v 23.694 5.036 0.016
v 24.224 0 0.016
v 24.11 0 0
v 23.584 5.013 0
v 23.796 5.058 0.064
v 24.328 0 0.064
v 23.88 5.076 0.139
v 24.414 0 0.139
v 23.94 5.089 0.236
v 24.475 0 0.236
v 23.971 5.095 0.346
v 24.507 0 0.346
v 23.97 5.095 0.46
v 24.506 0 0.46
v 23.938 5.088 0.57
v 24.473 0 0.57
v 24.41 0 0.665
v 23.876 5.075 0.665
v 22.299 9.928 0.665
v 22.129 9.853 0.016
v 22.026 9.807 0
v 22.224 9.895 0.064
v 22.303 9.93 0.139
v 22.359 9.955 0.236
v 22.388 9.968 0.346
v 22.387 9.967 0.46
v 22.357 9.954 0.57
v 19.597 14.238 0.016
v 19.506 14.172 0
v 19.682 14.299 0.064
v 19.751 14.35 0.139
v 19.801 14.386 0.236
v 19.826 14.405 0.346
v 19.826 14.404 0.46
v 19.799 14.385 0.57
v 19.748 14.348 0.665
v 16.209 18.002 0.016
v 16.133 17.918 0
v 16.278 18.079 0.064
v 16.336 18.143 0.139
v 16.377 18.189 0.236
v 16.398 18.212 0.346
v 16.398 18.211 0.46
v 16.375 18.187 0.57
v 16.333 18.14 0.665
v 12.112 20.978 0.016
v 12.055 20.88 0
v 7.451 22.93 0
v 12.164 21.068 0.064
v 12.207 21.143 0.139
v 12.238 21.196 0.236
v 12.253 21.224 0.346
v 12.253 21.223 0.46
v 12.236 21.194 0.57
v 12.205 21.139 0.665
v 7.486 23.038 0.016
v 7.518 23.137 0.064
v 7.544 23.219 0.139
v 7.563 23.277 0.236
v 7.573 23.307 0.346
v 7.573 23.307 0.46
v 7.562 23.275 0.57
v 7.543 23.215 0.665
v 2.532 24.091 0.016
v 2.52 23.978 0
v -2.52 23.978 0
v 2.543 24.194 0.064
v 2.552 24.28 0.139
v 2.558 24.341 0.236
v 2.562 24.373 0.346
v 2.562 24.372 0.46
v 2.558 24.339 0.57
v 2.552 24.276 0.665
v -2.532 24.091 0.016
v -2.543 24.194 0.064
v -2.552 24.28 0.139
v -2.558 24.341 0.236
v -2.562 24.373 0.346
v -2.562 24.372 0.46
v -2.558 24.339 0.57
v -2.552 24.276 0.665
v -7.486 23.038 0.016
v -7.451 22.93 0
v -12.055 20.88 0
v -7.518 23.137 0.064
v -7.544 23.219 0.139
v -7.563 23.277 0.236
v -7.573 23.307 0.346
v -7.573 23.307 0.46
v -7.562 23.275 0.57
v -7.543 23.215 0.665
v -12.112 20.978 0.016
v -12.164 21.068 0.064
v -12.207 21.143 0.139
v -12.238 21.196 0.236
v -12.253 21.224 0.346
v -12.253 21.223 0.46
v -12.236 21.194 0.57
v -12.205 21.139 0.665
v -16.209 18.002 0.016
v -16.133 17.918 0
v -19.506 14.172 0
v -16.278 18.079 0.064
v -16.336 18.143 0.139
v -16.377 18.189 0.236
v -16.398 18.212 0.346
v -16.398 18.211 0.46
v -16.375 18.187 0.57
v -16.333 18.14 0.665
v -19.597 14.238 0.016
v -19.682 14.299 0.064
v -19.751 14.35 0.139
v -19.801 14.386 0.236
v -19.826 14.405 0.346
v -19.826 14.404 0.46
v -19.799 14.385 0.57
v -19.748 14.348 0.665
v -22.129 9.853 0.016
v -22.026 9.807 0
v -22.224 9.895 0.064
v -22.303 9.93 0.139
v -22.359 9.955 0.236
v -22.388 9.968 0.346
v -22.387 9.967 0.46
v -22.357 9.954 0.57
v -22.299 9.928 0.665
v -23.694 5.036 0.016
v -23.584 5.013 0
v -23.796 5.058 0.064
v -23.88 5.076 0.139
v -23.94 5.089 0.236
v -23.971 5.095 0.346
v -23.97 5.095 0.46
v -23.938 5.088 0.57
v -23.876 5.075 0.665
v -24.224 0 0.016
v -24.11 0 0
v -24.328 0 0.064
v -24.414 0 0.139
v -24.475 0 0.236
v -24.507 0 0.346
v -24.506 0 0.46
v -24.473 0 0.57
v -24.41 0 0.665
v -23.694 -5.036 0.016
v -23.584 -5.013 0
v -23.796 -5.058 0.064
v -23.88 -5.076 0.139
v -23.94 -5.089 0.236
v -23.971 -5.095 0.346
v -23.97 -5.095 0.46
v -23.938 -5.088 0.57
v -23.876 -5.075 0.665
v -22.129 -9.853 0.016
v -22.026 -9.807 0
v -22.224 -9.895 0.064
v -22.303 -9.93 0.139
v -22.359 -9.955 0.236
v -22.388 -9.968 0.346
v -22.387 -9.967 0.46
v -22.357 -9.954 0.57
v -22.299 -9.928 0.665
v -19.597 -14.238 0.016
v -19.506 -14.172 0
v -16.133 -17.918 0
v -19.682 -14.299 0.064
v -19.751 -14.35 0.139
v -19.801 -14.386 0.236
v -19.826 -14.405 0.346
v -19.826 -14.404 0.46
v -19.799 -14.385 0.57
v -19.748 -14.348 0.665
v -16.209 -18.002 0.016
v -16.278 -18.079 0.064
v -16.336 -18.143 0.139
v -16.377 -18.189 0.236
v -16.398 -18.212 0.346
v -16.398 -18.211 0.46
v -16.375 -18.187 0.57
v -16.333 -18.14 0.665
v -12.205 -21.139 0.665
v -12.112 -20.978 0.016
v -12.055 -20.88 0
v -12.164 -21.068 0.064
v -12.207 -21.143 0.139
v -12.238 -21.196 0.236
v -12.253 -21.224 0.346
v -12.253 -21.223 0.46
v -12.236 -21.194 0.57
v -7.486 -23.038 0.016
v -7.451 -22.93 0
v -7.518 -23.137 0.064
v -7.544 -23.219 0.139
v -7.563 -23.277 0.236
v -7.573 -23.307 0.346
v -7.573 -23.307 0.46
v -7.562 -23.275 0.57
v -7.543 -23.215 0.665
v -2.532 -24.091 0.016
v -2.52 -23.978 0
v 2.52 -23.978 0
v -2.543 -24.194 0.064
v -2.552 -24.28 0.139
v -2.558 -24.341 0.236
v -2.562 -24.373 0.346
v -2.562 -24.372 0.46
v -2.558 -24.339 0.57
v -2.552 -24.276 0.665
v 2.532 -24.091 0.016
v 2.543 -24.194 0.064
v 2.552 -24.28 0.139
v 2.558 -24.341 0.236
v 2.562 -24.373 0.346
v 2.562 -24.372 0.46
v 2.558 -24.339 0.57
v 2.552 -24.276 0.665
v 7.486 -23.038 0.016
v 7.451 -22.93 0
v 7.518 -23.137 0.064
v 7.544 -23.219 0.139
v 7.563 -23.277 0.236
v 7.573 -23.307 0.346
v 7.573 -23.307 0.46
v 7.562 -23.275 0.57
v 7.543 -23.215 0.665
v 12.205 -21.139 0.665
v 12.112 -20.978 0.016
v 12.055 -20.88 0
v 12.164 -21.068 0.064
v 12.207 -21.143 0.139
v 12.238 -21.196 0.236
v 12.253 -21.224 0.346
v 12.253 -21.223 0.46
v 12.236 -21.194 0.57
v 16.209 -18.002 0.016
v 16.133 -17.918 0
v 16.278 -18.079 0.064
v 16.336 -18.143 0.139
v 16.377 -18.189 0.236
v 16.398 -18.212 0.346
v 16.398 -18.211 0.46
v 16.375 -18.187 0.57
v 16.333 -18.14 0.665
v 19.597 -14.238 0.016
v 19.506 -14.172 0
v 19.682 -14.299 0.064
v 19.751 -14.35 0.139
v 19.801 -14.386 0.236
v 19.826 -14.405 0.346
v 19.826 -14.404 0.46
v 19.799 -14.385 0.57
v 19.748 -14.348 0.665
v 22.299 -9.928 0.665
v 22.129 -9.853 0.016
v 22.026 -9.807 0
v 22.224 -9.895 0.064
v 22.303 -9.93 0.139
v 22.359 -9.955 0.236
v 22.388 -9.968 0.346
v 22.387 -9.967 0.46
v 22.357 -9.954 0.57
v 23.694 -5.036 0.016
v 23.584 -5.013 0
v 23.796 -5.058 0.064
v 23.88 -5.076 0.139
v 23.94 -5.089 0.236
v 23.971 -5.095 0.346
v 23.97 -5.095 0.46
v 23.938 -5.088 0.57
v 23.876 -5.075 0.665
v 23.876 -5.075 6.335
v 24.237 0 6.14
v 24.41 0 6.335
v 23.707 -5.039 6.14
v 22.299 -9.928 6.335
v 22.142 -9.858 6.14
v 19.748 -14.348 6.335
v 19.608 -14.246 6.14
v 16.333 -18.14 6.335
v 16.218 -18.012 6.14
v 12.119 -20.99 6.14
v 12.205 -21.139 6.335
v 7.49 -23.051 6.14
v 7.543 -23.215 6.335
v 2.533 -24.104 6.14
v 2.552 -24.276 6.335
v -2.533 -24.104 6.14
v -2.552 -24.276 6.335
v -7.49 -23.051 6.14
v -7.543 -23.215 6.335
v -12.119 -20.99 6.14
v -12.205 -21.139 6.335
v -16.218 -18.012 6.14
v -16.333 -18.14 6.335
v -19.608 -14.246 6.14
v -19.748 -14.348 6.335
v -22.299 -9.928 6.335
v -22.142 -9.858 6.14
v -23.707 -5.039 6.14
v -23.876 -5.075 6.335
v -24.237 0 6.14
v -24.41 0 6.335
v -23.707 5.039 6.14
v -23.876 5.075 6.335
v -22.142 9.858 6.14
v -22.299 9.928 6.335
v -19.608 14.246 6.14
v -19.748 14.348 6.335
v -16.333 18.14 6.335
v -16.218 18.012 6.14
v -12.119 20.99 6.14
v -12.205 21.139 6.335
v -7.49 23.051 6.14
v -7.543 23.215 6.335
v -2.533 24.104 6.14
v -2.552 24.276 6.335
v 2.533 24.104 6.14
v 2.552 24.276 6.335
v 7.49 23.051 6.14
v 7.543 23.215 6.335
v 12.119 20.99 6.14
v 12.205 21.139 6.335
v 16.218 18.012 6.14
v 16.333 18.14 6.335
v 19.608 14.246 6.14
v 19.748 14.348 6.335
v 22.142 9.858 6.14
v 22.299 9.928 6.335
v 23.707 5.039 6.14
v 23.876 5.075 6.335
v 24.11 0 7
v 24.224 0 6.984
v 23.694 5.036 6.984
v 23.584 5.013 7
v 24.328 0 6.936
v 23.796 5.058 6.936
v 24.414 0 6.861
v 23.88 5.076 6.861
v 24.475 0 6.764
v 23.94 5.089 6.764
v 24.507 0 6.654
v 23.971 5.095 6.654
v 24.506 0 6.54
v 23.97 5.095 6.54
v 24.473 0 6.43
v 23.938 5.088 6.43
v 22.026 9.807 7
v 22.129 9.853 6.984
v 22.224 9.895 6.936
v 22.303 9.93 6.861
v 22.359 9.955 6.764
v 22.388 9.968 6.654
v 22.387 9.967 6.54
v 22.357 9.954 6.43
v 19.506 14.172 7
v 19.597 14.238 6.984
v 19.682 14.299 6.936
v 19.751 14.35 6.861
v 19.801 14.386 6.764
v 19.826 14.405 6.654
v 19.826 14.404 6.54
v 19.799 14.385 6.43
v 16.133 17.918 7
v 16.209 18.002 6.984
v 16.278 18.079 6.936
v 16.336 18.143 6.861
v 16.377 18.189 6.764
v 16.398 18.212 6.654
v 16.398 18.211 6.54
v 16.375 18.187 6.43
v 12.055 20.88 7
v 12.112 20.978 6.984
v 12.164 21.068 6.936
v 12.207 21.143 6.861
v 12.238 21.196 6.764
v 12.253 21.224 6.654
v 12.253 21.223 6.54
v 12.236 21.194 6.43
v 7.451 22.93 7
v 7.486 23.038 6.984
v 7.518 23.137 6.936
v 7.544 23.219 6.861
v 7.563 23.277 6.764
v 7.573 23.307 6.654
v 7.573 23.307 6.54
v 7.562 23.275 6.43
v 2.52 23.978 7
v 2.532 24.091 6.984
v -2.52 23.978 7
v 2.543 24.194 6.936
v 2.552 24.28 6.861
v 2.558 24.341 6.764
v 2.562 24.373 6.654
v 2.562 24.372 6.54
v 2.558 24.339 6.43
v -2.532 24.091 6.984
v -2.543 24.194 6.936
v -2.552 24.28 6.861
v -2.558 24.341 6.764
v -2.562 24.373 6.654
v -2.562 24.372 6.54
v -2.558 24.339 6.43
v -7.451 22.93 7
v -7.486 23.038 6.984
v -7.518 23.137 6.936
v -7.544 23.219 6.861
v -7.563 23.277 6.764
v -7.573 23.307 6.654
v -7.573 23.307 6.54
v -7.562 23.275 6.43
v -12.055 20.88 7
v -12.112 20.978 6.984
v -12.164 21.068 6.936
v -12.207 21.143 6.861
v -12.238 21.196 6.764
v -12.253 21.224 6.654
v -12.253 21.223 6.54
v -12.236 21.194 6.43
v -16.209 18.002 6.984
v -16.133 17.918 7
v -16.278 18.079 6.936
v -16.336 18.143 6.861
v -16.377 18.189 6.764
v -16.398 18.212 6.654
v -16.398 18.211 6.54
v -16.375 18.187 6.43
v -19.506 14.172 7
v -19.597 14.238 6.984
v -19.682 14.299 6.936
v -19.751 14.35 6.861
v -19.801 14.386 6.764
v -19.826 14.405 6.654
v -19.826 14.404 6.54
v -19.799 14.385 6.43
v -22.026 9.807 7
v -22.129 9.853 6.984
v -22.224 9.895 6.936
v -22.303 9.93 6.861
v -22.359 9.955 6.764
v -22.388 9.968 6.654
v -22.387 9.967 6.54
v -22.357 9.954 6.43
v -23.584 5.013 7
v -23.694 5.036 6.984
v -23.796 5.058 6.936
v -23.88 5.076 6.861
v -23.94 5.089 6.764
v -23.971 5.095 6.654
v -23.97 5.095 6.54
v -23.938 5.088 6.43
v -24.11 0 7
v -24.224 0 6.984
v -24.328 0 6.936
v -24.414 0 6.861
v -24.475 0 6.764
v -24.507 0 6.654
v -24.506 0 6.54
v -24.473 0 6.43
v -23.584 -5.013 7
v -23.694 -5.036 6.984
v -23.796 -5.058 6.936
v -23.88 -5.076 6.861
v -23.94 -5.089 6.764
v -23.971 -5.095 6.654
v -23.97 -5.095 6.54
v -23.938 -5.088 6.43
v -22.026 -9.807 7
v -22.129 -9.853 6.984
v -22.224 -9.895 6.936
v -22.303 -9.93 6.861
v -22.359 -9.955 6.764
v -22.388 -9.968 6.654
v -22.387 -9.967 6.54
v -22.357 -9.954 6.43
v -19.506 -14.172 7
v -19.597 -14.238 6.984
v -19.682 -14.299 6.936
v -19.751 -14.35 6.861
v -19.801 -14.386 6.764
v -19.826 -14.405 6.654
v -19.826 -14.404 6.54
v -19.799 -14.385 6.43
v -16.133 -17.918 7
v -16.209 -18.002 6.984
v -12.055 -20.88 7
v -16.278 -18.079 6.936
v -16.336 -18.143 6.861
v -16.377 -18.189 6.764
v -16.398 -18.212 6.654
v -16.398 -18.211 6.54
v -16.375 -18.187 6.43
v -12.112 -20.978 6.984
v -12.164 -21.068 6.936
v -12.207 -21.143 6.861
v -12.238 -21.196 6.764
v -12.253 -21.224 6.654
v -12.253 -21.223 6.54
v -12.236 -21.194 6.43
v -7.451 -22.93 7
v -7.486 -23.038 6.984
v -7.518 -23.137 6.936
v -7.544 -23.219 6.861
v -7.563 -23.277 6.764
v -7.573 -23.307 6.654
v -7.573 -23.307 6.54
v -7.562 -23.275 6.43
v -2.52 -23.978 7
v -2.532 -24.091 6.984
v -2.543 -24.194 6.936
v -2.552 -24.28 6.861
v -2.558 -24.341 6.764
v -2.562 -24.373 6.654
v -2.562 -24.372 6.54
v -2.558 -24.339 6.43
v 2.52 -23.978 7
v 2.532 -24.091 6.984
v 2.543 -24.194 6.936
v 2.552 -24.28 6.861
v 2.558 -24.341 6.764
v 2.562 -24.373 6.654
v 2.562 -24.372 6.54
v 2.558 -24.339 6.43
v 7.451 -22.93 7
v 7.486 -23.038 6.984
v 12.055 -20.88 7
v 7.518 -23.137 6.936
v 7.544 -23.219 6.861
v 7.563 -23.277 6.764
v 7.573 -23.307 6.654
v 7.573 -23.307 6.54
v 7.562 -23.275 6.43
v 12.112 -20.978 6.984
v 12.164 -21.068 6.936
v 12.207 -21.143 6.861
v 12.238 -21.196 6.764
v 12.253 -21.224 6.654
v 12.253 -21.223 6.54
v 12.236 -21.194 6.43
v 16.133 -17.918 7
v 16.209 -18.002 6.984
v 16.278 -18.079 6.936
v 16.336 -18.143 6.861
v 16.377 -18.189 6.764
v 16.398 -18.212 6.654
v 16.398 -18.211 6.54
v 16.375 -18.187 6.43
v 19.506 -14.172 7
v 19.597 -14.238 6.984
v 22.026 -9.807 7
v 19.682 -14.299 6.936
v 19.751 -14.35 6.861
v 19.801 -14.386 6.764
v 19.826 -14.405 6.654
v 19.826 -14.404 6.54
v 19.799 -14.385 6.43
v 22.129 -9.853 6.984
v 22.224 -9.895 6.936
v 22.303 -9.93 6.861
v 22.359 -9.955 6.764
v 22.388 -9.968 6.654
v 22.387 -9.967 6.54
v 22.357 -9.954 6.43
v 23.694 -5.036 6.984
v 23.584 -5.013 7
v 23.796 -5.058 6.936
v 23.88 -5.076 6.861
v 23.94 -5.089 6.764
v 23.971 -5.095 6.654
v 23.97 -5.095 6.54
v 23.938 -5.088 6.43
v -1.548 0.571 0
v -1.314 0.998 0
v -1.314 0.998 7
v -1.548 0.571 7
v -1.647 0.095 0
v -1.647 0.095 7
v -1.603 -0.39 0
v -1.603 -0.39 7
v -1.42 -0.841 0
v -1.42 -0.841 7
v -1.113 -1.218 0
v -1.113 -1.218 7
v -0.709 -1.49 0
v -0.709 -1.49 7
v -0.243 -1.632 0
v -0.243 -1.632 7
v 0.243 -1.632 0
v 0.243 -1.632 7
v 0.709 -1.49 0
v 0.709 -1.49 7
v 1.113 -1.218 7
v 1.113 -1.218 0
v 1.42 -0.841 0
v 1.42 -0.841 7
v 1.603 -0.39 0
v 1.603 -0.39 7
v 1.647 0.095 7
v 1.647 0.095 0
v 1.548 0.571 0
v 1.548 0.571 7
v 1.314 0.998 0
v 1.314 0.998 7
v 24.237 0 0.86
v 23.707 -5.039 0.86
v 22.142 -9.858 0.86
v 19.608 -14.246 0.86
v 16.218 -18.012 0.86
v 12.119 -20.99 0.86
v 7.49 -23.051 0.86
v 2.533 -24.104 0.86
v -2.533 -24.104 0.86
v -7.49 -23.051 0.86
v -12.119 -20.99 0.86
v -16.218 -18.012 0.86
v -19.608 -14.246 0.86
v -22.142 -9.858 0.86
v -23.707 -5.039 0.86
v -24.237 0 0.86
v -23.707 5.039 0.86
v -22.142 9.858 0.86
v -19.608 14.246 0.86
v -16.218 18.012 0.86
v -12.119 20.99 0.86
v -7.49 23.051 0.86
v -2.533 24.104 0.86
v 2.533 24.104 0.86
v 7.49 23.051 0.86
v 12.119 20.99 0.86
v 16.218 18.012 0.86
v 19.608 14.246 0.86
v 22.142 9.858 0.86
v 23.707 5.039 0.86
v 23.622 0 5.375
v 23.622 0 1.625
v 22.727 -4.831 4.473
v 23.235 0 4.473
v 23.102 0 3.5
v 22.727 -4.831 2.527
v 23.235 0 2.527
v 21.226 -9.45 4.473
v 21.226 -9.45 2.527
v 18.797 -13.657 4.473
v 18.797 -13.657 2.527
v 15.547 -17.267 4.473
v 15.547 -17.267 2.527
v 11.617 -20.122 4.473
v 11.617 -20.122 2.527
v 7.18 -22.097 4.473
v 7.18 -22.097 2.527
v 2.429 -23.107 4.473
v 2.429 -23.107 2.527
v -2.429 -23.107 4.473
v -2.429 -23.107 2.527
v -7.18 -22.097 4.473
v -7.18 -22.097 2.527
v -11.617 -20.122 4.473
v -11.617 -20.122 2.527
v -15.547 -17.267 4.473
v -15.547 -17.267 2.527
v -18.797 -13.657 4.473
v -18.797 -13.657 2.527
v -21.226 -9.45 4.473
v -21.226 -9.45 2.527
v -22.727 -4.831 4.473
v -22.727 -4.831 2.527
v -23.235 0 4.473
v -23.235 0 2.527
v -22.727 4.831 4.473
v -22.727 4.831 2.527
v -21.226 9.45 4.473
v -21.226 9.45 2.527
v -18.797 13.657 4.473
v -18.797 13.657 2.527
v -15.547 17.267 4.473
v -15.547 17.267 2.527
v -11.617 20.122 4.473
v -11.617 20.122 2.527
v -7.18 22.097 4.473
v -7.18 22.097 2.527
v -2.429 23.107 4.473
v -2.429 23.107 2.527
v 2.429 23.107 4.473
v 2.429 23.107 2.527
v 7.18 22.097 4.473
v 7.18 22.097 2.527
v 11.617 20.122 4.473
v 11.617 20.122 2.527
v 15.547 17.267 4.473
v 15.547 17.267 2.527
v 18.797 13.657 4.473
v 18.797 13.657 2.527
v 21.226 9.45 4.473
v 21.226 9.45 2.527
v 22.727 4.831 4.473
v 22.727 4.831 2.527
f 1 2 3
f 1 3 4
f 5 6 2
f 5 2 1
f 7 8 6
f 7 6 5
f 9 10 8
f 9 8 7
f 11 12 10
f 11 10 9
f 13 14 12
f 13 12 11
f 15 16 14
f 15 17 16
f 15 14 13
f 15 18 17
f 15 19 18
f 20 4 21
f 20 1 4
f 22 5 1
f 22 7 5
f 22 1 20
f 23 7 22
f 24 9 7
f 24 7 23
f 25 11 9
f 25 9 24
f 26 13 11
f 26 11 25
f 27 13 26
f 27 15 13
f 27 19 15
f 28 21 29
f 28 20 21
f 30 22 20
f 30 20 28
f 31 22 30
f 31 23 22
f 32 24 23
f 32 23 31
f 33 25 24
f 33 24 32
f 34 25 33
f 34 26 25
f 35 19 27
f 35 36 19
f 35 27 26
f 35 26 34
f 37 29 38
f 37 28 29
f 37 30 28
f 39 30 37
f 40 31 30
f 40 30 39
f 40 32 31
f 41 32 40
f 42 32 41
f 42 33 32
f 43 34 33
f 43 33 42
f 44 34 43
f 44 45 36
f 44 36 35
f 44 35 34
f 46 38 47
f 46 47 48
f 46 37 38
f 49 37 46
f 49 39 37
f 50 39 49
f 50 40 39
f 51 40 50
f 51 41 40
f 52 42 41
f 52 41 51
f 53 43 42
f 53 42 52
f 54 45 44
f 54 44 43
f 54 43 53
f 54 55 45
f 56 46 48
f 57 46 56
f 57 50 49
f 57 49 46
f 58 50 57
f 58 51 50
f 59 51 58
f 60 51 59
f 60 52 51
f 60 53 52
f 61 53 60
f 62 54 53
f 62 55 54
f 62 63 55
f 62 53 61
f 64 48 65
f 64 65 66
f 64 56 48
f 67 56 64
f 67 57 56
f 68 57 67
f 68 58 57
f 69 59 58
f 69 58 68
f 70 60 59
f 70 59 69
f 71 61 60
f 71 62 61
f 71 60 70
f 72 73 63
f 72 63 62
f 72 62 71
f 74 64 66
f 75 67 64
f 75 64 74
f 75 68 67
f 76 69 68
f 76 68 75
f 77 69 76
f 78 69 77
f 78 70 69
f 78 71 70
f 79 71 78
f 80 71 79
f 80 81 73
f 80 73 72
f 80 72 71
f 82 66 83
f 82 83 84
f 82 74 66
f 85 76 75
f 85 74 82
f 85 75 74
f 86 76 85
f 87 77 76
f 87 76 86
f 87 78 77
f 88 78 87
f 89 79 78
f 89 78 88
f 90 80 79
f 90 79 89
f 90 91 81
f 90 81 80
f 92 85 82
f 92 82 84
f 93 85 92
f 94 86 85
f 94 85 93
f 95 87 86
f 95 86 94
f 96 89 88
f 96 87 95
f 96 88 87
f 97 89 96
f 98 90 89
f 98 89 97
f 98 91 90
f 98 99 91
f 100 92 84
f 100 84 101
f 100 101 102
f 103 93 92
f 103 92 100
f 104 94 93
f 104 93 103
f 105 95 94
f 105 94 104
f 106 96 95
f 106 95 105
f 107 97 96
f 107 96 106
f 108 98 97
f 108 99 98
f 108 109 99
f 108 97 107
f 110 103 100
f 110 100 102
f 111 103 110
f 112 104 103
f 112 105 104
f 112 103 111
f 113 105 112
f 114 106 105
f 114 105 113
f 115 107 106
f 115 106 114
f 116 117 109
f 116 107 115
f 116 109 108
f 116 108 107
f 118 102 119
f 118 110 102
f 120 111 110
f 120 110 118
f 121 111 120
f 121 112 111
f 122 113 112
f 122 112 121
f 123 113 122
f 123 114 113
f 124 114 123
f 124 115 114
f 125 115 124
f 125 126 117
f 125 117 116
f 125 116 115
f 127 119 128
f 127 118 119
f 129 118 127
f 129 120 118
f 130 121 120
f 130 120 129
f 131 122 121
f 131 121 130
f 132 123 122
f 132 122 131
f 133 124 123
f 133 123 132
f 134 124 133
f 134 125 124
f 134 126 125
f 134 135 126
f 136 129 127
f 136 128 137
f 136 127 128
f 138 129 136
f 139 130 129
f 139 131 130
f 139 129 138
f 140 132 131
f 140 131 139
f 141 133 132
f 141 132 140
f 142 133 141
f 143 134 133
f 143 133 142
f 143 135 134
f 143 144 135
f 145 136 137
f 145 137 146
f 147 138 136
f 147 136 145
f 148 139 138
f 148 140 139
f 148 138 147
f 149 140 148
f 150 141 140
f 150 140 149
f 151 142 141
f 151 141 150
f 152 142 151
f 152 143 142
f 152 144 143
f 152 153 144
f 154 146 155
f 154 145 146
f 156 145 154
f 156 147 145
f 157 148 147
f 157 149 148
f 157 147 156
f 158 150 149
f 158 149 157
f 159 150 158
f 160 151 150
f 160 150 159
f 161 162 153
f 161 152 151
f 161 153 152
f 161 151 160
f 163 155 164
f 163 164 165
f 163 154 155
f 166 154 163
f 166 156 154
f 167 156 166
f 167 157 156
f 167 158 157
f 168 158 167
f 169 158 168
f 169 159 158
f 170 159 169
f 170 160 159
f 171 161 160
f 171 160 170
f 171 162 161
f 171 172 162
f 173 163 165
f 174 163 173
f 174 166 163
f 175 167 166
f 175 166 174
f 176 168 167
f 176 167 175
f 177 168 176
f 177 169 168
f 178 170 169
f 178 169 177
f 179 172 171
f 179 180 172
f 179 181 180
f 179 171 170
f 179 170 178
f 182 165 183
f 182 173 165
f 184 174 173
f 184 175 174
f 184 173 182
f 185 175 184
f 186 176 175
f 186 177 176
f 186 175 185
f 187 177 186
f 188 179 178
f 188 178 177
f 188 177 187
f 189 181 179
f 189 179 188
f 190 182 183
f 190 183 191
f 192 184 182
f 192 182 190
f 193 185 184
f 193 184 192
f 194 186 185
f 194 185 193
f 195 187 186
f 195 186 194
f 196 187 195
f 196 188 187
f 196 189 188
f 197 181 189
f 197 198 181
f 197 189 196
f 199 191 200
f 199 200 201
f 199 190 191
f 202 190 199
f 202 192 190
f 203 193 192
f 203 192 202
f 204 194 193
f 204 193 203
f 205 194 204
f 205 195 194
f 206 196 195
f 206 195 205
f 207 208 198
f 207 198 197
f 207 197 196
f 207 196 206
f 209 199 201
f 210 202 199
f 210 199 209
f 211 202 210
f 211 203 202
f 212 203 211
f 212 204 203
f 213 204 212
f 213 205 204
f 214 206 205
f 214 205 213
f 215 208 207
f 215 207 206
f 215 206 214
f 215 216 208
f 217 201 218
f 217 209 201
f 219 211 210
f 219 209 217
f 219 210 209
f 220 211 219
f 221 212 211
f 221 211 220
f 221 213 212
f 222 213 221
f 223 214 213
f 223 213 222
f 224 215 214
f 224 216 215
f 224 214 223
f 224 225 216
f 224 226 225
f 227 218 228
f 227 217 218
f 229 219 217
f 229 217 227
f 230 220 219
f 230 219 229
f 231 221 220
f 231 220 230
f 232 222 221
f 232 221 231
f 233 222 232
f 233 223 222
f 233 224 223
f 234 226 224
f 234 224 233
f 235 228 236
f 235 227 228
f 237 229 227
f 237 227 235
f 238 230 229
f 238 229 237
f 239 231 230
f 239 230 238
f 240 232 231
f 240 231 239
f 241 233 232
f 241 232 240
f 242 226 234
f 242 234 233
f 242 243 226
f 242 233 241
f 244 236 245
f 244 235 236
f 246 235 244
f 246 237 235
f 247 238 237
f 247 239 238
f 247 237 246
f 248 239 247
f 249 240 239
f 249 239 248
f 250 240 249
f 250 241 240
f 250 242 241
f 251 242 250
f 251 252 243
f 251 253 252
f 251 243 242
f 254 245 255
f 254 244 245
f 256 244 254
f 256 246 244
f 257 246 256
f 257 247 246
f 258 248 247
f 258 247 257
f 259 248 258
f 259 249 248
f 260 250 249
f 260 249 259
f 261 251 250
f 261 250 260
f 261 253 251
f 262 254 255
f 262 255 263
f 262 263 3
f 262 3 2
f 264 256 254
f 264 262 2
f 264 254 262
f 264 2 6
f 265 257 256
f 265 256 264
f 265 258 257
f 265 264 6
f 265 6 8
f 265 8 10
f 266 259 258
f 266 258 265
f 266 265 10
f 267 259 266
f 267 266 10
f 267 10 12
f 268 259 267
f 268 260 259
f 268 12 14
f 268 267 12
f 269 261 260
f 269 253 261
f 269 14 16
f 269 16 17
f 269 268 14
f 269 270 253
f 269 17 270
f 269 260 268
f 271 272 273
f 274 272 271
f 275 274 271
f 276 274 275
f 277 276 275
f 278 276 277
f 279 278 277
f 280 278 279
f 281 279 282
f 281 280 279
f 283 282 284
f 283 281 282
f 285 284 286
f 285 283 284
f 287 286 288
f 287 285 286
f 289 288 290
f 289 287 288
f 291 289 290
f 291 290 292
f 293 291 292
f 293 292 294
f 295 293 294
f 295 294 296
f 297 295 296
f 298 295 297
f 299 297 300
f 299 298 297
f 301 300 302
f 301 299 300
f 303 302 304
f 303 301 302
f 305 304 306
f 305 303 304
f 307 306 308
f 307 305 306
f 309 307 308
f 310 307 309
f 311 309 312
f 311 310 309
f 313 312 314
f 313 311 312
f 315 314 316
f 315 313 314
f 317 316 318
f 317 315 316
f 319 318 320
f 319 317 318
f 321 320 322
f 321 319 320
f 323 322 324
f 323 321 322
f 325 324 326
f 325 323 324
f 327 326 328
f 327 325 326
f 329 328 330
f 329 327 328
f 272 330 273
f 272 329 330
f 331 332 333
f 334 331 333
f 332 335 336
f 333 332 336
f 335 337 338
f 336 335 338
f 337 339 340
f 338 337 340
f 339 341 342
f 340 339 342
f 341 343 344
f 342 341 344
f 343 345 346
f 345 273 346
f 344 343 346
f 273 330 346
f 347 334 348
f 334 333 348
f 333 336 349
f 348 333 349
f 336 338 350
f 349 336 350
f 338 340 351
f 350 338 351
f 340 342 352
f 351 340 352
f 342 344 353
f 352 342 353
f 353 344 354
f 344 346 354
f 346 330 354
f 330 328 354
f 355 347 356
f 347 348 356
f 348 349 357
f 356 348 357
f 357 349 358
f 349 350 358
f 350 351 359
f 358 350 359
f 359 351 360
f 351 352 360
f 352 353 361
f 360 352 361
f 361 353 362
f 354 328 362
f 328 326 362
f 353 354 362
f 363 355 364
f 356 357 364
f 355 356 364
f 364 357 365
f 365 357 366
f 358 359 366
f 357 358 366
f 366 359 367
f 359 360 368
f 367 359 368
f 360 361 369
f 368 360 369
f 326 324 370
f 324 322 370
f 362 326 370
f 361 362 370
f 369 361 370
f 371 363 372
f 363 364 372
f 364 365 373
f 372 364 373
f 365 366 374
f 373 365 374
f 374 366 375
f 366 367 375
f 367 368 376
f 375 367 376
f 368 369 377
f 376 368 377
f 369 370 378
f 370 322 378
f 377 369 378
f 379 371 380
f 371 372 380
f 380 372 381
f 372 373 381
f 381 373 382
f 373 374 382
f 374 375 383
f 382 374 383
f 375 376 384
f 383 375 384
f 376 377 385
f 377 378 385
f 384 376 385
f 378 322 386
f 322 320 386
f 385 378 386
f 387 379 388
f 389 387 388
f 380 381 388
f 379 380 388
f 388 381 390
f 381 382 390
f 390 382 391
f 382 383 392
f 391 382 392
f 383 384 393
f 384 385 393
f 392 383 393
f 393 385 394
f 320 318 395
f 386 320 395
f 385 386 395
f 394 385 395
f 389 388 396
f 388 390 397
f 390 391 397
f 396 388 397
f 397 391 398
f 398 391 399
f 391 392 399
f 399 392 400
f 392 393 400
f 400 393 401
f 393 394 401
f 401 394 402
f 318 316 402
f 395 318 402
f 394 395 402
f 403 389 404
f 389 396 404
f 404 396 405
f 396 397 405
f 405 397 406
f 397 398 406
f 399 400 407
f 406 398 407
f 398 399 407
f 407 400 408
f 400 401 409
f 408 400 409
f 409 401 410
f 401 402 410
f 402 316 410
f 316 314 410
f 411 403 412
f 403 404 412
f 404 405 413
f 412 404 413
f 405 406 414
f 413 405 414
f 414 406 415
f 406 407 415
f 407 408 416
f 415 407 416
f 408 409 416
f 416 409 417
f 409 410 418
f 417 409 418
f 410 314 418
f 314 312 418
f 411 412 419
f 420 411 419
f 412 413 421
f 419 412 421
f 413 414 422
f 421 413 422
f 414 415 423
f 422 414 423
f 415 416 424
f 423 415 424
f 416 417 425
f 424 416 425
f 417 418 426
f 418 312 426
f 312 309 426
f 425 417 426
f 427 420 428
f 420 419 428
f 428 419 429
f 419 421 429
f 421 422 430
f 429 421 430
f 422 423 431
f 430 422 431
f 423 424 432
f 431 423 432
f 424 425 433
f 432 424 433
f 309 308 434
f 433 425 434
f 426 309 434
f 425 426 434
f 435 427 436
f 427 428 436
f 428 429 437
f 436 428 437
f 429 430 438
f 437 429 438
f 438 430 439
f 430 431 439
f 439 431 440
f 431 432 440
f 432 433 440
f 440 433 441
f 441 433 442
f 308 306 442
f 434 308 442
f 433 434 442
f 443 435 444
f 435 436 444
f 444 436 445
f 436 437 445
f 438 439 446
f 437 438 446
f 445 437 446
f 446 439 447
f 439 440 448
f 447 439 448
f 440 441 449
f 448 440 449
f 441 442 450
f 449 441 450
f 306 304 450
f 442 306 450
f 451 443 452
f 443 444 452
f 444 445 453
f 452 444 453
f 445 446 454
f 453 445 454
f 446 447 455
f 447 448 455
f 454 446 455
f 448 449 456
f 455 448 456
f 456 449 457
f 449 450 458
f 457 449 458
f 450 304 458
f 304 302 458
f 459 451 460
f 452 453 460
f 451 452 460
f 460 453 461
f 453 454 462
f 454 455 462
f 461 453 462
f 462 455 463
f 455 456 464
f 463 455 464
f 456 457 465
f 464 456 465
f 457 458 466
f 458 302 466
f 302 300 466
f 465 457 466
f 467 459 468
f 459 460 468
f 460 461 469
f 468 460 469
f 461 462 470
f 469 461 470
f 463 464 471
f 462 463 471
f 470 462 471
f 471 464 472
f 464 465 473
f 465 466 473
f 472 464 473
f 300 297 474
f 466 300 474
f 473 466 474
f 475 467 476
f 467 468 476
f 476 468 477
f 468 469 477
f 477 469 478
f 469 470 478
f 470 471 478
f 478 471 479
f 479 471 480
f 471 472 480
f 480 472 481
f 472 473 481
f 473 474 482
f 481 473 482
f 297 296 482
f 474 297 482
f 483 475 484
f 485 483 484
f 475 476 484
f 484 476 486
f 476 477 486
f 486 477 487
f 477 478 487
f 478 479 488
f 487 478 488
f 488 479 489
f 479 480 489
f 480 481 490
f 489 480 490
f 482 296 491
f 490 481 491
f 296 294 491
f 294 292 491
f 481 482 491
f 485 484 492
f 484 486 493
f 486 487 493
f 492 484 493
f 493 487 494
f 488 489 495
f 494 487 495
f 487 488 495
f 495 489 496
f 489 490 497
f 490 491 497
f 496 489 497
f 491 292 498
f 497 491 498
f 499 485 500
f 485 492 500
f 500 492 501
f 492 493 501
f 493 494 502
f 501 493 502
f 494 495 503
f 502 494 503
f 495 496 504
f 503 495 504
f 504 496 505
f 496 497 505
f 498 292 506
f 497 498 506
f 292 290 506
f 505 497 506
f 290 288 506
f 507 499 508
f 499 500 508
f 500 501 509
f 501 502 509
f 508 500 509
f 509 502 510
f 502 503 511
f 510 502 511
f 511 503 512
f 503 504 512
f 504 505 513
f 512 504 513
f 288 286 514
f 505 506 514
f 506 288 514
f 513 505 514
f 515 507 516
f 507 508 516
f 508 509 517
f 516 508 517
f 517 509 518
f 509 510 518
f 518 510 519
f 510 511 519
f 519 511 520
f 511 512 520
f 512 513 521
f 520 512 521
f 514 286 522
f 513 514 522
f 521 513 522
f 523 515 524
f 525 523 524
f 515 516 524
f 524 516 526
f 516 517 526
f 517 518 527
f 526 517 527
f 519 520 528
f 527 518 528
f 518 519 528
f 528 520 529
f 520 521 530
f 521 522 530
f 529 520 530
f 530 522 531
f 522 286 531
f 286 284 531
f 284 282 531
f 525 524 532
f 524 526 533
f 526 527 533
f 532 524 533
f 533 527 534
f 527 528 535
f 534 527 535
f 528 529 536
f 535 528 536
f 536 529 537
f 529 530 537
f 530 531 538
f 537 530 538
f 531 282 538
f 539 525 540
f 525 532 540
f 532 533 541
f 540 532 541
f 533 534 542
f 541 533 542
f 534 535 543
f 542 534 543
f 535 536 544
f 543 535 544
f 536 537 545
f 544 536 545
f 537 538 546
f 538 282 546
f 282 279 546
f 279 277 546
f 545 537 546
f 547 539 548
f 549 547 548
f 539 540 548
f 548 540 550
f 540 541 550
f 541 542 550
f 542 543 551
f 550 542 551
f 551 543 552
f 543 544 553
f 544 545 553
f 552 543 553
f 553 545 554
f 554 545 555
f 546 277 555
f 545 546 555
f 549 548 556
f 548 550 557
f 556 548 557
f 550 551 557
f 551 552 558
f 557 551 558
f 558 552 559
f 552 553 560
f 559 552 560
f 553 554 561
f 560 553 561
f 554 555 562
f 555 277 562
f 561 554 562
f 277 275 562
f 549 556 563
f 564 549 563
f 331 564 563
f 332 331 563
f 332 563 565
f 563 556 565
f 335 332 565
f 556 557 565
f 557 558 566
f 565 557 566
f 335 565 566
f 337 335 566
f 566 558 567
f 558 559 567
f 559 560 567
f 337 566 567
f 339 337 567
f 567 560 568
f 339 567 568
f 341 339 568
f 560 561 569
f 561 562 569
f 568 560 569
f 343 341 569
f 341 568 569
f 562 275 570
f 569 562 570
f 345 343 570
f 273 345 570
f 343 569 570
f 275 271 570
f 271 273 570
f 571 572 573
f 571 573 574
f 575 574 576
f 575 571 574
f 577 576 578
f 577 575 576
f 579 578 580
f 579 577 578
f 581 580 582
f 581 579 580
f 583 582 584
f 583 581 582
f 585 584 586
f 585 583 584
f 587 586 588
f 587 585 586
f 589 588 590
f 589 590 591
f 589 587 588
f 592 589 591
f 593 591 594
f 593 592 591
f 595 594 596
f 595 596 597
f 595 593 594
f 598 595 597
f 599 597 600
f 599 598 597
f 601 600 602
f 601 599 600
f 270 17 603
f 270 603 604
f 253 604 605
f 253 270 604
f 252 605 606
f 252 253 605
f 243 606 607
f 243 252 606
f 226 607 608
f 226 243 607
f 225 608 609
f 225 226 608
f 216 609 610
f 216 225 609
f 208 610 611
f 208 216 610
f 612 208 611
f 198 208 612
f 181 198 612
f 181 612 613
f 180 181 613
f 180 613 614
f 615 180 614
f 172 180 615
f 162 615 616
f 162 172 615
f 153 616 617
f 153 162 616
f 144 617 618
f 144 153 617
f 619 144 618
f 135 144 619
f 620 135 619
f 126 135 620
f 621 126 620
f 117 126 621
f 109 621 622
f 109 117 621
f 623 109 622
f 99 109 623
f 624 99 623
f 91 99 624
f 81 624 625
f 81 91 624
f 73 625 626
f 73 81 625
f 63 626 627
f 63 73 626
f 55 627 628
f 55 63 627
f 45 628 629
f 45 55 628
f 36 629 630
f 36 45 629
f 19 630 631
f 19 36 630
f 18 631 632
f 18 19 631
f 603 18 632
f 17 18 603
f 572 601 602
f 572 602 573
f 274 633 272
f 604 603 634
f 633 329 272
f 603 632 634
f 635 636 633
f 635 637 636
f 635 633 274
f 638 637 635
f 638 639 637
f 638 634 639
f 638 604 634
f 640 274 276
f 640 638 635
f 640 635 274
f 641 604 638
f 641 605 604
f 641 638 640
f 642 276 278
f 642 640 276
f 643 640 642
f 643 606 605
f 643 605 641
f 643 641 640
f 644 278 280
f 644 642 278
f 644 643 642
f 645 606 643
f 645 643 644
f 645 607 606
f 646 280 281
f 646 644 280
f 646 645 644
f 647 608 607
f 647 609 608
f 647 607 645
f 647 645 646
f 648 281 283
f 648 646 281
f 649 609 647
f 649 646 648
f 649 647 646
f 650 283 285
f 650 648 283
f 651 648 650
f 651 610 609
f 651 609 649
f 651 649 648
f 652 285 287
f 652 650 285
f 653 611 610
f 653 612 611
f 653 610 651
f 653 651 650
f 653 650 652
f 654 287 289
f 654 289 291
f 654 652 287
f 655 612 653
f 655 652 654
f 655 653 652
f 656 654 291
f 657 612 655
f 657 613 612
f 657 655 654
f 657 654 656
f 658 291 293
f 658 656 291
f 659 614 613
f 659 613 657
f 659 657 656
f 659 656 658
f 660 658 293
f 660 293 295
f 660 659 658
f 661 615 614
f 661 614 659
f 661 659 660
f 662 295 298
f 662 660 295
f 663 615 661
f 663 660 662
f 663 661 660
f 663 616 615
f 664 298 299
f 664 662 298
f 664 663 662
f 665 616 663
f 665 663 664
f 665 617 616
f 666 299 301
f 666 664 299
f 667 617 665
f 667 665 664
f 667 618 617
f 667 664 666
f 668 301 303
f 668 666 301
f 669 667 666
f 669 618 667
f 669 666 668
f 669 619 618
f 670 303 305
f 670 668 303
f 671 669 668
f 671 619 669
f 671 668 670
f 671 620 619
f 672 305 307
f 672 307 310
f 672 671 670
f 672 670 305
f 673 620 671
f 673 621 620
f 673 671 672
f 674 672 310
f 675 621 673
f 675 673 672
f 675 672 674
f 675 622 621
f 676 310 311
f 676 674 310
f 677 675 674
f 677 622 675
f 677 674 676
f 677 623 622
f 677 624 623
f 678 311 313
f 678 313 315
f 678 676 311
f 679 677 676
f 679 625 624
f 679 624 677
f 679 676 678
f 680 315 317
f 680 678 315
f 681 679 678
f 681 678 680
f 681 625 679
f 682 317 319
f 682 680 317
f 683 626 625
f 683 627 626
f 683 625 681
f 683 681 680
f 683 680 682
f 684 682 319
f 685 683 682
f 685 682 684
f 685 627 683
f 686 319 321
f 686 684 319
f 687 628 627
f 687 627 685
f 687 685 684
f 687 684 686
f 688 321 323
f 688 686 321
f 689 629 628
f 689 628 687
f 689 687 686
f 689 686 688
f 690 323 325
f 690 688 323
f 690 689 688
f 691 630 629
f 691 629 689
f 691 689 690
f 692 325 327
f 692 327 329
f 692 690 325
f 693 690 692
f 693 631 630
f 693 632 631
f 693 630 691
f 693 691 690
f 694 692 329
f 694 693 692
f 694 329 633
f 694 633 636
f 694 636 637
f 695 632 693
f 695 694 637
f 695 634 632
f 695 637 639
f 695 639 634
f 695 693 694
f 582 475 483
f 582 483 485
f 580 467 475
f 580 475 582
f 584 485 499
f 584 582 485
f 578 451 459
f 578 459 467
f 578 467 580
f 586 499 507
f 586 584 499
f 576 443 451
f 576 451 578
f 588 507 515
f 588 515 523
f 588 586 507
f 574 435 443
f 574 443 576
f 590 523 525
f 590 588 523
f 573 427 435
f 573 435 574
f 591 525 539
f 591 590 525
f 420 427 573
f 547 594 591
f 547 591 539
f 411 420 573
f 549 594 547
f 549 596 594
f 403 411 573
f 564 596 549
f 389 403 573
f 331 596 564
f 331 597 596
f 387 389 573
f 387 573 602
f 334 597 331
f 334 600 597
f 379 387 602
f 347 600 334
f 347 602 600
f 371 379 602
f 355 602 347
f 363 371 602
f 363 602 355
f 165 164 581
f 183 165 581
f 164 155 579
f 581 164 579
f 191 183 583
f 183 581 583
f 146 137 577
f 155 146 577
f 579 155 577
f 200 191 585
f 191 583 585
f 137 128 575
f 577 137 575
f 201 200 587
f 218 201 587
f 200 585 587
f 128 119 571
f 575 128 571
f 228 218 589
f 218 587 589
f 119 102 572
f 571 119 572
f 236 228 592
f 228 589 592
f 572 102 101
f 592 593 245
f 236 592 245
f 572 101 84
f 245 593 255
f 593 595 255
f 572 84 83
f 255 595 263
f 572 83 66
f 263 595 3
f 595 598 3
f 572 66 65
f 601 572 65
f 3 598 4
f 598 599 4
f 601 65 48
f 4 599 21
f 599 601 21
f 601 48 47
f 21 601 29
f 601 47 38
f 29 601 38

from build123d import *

# Parameters (mm, degrees)
SKETCH1_R           = 25
SKETCH1_R_2         = 1.5
BOSS_EXTRUDE1_DEPTH = 7
FILLET1_R           = 0.4
BOSS_EXTRUDE2_DEPTH = 7
MOVE_FACE1_DEPTH    = 7


# Read off the part's stored shape, not the designer's step: Move Face1
with BuildPart() as part:
    # Sketch1 → Boss-Extrude1 (new body)
    with BuildSketch(Plane.XY):
        Circle(SKETCH1_R)
        Circle(SKETCH1_R_2, mode=Mode.SUBTRACT)
    extrude(amount=BOSS_EXTRUDE1_DEPTH)

    # Sketch2 → Cut-Revolve1 (revolve, cut)
    with BuildSketch(Plane(origin=(0, 0, 0), x_dir=(0, 0, -1), z_dir=(1, 0, 0)), mode=Mode.PRIVATE) as cut_revolve1_sk:
        with BuildLine():
            Line((-7, 25), (-6.139887117, 24.237039248))
            ThreePointArc((-6.139887117, 24.237039248), (-3.5, 23.102184954), (-0.860112883, 24.237039248))
            Line((-0.860112883, 24.237039248), (0, 25))
            Line((0, 25), (-7, 25))
        make_face()
    revolve(cut_revolve1_sk.sketch.rotate(Axis((0, 0, 7), (0, 0, -1)), 90), axis=Axis((0, 0, 7), (0, 0, -1)), mode=Mode.SUBTRACT)

    # Fillet1
    fillet1_edges = [part.edges().sort_by_distance(p)[0] for p in [
        (-25, 0, 0),
        (-25, 0, 7),
    ]]
    fillet(fillet1_edges, radius=FILLET1_R)

    # Sketch3 → Boss-Extrude2 (add, through all)
    with BuildSketch(Plane.XY.offset(7)):
        with BuildLine():
            Line((-1.12, 0.997797575), (1.12, 0.997797575))
            ThreePointArc((1.12, 0.997797575), (0, 1.5), (-1.12, 0.997797575))
        make_face()
    extrude(amount=-BOSS_EXTRUDE2_DEPTH)

    # Move Face1 outline → Move Face1 (cut)
    with BuildSketch(Plane.XY):
        with BuildLine():
            ThreePointArc((-1.314115672, 0.997797575), (0, -1.65), (1.314115672, 0.997797575))
            Line((1.314115672, 0.997797575), (1.12, 0.997797575))
            ThreePointArc((1.12, 0.997797575), (0, -1.5), (-1.12, 0.997797575))
            Line((-1.12, 0.997797575), (-1.314115672, 0.997797575))
        make_face()
    extrude(amount=MOVE_FACE1_DEPTH, mode=Mode.SUBTRACT)


solid = part.part
